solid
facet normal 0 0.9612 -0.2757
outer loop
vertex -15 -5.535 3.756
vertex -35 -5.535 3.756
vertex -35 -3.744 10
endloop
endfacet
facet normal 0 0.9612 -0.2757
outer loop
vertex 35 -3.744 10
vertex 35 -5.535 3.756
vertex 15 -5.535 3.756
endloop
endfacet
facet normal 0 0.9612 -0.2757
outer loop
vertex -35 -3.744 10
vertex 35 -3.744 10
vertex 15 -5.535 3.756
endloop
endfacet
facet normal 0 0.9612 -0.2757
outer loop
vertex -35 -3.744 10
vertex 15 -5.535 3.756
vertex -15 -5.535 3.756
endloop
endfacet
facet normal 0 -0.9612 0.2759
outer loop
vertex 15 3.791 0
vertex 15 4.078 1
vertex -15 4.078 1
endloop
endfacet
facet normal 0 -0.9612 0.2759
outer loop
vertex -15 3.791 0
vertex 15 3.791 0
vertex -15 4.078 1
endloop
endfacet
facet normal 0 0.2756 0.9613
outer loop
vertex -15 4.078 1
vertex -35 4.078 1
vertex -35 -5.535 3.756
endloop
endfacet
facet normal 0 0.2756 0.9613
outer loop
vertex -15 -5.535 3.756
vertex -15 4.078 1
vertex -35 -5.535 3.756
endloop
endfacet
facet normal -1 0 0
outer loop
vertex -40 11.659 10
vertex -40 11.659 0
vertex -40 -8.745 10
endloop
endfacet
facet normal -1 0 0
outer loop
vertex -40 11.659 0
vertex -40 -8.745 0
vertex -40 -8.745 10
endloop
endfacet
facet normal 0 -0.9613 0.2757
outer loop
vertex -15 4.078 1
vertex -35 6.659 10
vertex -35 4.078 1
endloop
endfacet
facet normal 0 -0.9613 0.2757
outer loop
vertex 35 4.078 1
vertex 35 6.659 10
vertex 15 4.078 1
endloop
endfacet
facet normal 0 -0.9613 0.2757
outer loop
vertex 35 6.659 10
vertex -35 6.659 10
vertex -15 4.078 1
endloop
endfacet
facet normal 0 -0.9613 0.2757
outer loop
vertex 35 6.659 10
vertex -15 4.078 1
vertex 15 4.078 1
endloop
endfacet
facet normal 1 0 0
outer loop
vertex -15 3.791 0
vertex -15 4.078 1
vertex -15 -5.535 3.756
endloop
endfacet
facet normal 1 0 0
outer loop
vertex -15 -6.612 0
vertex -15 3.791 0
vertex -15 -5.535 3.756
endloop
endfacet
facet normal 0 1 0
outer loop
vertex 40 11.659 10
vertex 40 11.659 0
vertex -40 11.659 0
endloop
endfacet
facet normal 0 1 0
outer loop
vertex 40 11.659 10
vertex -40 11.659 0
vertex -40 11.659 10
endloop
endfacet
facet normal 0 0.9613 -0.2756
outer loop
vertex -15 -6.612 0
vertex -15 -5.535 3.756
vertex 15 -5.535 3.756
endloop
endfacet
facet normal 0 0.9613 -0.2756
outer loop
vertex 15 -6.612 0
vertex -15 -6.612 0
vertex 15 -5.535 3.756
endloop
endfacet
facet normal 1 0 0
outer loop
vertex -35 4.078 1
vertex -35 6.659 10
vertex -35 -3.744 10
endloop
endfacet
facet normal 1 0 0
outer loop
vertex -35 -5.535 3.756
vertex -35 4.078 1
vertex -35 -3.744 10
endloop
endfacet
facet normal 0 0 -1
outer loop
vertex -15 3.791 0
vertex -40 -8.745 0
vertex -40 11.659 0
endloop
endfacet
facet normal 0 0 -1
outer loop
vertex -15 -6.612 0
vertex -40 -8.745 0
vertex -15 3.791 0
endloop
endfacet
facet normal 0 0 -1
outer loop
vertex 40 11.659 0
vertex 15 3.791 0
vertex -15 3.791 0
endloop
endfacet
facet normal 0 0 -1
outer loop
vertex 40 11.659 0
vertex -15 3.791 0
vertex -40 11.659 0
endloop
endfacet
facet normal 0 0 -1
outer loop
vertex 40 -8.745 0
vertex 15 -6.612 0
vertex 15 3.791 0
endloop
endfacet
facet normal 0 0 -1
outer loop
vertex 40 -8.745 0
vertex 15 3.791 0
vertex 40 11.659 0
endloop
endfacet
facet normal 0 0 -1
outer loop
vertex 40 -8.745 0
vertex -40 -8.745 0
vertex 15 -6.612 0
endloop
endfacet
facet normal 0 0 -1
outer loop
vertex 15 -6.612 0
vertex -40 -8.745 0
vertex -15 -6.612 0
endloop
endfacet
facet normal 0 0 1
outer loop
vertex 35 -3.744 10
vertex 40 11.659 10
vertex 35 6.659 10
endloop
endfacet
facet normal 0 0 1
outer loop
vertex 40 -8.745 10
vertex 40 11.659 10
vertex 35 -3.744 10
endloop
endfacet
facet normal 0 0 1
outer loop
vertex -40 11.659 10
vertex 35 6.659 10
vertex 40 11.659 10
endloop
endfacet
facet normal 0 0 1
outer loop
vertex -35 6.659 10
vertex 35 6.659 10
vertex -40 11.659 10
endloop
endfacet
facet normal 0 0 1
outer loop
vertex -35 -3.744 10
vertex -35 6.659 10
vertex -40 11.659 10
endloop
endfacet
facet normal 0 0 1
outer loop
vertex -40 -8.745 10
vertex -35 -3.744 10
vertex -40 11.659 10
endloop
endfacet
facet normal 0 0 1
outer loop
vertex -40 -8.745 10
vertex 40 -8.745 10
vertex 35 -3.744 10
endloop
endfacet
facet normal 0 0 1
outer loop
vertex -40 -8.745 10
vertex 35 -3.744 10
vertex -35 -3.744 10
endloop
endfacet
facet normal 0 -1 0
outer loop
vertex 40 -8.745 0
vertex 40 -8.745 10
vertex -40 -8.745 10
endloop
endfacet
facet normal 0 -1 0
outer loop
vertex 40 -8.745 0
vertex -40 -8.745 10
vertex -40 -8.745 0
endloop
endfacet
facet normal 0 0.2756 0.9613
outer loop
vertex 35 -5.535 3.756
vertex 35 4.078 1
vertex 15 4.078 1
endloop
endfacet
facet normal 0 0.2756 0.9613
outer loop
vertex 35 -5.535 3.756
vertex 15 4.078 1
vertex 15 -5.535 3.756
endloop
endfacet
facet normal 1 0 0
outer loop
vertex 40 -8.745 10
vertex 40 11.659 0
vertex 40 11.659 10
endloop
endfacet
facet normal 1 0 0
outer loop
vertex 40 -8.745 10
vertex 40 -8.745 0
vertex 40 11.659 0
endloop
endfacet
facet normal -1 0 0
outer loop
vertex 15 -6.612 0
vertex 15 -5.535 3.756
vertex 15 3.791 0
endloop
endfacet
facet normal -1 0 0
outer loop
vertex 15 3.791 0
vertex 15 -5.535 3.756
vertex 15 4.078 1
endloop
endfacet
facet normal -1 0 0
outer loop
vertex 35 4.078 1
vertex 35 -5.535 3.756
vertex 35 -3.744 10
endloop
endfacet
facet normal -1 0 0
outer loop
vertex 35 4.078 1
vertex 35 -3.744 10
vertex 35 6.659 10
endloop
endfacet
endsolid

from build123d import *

# Parameters (mm, degrees)
F1_DEPTH  = 35
F3_W      = 14.1933254312
F3_H      = 10
F4_DEPTH  = 5
F6_DEPTH  = 5
F8_DEPTH  = 0.5
F9_DEPTH  = 200
F10_DEPTH = 1.71
F11_DEPTH = 4


with BuildPart() as f1:
    # F0 (on Right) → F1 (new body, symmetric)
    with BuildSketch(Plane.YZ):
        Polygon((4.0779394949, -1.9816074769), (-5.5346774645, 0.7747660812), (-3.7443463919, 7.0183925231), (-6.5346774645, 7.0183925231), (-6.5346774645, -2.9816074769), (7.6586479667, -2.9816074769), (7.6586479667, 7.0183925231), (6.6586479667, 7.0183925231), align=None)
    extrude(amount=F1_DEPTH, both=True)


with BuildPart() as f1_1:
    # F2: moved
    add(f1.part.moved(Location((0, 0, 2.9817))))

    # F3 (on face) → F4 (join)
    with BuildSketch(Plane(origin=(-35, 0, 0), x_dir=(0, -1, 0), z_dir=(-1, 0, 0))):
        with Locations((-0.5619852511, 5.0000925231)):
            Rectangle(F3_W, F3_H)
    extrude(amount=F4_DEPTH)

    # F5 (on face) → F6 (join)
    with BuildSketch(Plane.YZ.offset(35)):
        Polygon((-3.7443463919, 10.0000925231), (-6.5346774645, 10.0000925231), (-6.5346774645, 9.25231e-05), (7.6586479667, 9.25231e-05), (7.6586479667, 10.0000925231), (6.6586479667, 10.0000925231), (4.0779394949, 1.0000925231), (-5.5346774645, 3.7564660812), align=None)
        Polygon((6.6586479667, 10.0000925231), (-3.7443463919, 10.0000925231), (-5.5346774645, 3.7564660812), (4.0779394949, 1.0000925231), align=None)
    extrude(amount=F6_DEPTH)

    # F8 (add): a face of the model
    f8_faces = [f1_1.faces().sort_by_distance(p)[0] for p in [
        (0, -6.5346774645, 5.0000925231),
    ]]
    extrude(f8_faces, amount=F8_DEPTH)

    # F7 (on face) → F9 (cut)
    with BuildSketch(Plane(origin=(0, 0.574809482, 2.00459889), x_dir=(1, 0, 0), z_dir=(0, 0.2756373558, 0.9612616959))):
        Polygon((15, 3.6443041761), (0, 3.6443041761), (-15, 3.6443041761), (-15, -6.3556958239), (15, -6.3556958239), align=None)
    extrude(amount=-F9_DEPTH, mode=Mode.SUBTRACT)

    # F10 (add): a face of the model
    f10_faces = [f1_1.faces().sort_by_distance(p)[0] for p in [
        (0, -7.0346774645, 5.0000925231),
    ]]
    extrude(f10_faces, amount=F10_DEPTH)

    # F11 (add): a face of the model
    f11_faces = [f1_1.faces().sort_by_distance(p)[0] for p in [
        (0, 7.6586479667, 5.0000925231),
    ]]
    extrude(f11_faces, amount=F11_DEPTH)


solid = f1_1.part
